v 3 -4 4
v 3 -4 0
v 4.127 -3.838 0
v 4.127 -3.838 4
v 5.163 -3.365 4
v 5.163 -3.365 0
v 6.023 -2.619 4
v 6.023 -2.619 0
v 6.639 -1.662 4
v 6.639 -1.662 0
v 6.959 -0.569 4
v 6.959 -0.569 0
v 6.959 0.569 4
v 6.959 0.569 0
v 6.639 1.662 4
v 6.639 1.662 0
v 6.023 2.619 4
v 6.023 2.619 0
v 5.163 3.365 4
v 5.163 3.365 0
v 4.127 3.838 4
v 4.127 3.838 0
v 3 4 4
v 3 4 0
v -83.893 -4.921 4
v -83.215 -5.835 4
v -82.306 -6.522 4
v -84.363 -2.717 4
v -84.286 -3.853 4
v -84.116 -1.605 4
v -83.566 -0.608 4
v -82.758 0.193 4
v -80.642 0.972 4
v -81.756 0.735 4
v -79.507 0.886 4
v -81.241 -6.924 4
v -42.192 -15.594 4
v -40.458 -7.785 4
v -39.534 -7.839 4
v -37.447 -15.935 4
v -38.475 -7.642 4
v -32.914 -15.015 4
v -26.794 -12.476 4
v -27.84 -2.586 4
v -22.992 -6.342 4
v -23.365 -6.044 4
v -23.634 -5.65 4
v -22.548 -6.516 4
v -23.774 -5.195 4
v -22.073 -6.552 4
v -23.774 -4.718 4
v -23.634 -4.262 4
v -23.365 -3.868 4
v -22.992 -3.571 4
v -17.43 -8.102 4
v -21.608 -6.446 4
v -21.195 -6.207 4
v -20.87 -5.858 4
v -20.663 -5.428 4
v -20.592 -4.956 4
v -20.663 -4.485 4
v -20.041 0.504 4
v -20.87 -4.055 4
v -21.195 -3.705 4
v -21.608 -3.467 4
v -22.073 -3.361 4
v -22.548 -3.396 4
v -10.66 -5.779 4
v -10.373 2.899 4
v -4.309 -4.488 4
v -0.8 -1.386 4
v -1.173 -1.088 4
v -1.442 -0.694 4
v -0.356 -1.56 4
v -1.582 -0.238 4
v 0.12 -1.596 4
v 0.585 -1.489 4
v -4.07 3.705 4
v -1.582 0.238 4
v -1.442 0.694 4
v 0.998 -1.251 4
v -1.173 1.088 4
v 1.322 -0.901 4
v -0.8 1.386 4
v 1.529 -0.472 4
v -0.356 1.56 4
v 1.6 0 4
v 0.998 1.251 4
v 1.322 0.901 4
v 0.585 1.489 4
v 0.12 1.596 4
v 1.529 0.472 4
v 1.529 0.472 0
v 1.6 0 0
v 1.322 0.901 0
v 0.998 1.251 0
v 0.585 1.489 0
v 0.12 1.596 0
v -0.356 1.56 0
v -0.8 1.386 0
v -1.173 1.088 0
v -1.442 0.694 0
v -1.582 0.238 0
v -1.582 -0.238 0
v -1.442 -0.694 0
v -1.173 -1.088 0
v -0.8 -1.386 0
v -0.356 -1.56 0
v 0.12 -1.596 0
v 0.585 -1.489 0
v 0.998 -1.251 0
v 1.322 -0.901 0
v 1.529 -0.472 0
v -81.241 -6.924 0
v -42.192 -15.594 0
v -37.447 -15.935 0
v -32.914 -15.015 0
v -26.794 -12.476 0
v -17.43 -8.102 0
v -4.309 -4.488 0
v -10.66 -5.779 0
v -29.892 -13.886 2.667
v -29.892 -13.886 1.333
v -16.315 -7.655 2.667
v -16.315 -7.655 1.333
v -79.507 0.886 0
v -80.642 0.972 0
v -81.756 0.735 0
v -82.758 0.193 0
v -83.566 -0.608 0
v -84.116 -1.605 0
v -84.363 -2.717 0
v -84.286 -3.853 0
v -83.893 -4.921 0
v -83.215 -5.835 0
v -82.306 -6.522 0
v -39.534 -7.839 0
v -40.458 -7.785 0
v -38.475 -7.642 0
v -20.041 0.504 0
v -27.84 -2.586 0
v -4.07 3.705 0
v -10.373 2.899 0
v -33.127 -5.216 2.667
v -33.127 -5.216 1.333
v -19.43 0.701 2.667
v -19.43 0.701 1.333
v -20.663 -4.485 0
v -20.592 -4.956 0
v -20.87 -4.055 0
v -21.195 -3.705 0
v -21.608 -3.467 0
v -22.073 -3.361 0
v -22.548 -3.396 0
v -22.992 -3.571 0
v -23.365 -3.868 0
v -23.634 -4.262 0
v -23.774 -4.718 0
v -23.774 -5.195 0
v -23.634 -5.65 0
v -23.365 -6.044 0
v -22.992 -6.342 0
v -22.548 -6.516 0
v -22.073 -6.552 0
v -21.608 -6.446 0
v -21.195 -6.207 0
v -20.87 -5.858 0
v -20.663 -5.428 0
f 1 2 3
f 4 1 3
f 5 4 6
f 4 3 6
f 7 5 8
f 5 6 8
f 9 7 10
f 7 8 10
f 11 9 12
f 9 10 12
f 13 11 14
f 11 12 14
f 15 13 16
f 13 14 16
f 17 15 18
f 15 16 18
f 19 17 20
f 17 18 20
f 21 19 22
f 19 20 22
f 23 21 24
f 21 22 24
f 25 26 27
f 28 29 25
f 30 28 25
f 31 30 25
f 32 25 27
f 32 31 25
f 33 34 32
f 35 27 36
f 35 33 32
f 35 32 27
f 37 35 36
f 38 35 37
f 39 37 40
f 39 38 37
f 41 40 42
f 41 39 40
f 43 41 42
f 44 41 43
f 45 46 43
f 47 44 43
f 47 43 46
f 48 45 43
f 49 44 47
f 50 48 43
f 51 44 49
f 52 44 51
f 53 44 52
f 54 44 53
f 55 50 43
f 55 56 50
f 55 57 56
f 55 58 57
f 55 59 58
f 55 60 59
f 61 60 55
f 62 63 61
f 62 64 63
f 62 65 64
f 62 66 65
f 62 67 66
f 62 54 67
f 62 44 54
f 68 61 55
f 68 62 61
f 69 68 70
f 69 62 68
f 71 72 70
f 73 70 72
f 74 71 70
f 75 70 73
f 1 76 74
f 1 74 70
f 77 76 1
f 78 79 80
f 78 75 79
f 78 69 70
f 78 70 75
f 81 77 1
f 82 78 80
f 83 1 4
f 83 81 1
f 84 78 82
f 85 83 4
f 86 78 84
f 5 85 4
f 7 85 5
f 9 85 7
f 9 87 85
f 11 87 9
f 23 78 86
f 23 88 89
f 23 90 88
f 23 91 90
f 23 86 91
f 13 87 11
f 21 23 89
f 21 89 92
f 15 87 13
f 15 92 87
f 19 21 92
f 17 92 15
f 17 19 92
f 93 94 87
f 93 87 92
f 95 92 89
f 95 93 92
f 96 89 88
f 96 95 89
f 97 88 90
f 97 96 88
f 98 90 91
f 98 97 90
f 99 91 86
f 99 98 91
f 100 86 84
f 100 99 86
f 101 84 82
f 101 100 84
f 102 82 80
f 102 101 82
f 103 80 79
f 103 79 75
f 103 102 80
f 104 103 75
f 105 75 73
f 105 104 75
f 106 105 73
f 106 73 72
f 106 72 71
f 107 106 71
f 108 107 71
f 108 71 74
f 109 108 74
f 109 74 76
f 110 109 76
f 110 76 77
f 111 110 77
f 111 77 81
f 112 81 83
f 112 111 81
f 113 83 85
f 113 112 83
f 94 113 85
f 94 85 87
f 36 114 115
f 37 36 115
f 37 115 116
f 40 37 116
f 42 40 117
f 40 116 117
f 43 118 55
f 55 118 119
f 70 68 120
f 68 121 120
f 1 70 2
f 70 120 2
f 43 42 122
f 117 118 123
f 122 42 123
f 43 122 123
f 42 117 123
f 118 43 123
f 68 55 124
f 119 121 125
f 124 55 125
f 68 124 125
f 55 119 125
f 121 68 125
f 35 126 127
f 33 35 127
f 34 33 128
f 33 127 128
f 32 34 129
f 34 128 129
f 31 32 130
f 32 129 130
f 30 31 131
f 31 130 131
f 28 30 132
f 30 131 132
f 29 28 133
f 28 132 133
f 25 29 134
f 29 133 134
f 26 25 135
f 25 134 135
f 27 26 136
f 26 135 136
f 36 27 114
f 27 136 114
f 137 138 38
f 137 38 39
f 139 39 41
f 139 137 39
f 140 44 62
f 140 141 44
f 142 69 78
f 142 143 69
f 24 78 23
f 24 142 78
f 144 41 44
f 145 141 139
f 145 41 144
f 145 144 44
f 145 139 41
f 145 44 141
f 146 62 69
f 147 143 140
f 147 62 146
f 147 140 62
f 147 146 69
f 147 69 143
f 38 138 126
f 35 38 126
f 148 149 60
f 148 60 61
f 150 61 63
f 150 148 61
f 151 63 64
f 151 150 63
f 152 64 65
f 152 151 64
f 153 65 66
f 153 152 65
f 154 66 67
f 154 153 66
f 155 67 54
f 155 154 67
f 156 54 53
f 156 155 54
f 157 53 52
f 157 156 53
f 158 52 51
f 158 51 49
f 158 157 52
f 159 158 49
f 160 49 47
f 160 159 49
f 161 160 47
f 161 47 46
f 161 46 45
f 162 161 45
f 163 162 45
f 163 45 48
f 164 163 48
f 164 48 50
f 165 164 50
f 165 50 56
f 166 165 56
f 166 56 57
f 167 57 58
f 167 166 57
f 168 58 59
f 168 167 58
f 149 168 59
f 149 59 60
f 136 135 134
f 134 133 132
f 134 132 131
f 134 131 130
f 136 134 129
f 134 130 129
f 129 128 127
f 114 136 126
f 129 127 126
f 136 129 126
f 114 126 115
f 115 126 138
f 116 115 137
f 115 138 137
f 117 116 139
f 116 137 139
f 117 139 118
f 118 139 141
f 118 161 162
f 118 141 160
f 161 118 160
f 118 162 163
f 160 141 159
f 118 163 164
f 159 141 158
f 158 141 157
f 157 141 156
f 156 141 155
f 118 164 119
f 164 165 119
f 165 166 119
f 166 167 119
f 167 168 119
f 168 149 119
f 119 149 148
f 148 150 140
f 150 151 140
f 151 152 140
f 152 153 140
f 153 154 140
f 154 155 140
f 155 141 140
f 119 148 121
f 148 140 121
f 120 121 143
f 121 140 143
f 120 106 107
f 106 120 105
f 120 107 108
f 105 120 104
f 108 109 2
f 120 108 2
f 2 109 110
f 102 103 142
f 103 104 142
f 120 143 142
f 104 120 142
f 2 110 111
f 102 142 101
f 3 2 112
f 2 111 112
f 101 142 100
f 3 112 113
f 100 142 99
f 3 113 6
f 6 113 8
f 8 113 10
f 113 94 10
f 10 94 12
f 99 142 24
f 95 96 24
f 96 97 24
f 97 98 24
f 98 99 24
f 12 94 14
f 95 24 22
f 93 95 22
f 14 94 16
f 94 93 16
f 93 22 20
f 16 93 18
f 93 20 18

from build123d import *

# Parameters (mm, degrees)
SKETCH1_R           = 1.6
BOSS_EXTRUDE1_DEPTH = 4


with BuildPart() as part:
    # Sketch1 → Boss-Extrude1 (new body)
    with BuildSketch(Plane.XY):
        with BuildLine():
            Line((-81.241225793, -6.924028443), (-42.192224122, -15.594407241))
            add(Edge.make_bspline(
                [(-42.192224122, -15.594407241), (-29.042309964, -18.51419346), (-20.671199627, -4), (3, -4)],
                knots=[0, 0, 0, 0, 1, 1, 1, 1], degree=3))
            ThreePointArc((3, -4), (7, 0), (3, 4))
            add(Edge.make_bspline(
                [(-40.458148362, -7.784606907), (-35.521822822, -8.880660851), (-24.58512885, 4), (3, 4)],
                knots=[0, 0, 0, 0, 1, 1, 1, 1], degree=3))
            Line((-40.458148362, -7.784606907), (-79.507150033, 0.885771891))
            ThreePointArc((-79.507150033, 0.885771891), (-84.27908808, -2.152090396), (-81.241225793, -6.924028443))
        make_face()
        with Locations((-22.192224122, -4.956209462)):
            Circle(SKETCH1_R, mode=Mode.SUBTRACT)
        Circle(SKETCH1_R, mode=Mode.SUBTRACT)
    extrude(amount=BOSS_EXTRUDE1_DEPTH)


solid = part.part
